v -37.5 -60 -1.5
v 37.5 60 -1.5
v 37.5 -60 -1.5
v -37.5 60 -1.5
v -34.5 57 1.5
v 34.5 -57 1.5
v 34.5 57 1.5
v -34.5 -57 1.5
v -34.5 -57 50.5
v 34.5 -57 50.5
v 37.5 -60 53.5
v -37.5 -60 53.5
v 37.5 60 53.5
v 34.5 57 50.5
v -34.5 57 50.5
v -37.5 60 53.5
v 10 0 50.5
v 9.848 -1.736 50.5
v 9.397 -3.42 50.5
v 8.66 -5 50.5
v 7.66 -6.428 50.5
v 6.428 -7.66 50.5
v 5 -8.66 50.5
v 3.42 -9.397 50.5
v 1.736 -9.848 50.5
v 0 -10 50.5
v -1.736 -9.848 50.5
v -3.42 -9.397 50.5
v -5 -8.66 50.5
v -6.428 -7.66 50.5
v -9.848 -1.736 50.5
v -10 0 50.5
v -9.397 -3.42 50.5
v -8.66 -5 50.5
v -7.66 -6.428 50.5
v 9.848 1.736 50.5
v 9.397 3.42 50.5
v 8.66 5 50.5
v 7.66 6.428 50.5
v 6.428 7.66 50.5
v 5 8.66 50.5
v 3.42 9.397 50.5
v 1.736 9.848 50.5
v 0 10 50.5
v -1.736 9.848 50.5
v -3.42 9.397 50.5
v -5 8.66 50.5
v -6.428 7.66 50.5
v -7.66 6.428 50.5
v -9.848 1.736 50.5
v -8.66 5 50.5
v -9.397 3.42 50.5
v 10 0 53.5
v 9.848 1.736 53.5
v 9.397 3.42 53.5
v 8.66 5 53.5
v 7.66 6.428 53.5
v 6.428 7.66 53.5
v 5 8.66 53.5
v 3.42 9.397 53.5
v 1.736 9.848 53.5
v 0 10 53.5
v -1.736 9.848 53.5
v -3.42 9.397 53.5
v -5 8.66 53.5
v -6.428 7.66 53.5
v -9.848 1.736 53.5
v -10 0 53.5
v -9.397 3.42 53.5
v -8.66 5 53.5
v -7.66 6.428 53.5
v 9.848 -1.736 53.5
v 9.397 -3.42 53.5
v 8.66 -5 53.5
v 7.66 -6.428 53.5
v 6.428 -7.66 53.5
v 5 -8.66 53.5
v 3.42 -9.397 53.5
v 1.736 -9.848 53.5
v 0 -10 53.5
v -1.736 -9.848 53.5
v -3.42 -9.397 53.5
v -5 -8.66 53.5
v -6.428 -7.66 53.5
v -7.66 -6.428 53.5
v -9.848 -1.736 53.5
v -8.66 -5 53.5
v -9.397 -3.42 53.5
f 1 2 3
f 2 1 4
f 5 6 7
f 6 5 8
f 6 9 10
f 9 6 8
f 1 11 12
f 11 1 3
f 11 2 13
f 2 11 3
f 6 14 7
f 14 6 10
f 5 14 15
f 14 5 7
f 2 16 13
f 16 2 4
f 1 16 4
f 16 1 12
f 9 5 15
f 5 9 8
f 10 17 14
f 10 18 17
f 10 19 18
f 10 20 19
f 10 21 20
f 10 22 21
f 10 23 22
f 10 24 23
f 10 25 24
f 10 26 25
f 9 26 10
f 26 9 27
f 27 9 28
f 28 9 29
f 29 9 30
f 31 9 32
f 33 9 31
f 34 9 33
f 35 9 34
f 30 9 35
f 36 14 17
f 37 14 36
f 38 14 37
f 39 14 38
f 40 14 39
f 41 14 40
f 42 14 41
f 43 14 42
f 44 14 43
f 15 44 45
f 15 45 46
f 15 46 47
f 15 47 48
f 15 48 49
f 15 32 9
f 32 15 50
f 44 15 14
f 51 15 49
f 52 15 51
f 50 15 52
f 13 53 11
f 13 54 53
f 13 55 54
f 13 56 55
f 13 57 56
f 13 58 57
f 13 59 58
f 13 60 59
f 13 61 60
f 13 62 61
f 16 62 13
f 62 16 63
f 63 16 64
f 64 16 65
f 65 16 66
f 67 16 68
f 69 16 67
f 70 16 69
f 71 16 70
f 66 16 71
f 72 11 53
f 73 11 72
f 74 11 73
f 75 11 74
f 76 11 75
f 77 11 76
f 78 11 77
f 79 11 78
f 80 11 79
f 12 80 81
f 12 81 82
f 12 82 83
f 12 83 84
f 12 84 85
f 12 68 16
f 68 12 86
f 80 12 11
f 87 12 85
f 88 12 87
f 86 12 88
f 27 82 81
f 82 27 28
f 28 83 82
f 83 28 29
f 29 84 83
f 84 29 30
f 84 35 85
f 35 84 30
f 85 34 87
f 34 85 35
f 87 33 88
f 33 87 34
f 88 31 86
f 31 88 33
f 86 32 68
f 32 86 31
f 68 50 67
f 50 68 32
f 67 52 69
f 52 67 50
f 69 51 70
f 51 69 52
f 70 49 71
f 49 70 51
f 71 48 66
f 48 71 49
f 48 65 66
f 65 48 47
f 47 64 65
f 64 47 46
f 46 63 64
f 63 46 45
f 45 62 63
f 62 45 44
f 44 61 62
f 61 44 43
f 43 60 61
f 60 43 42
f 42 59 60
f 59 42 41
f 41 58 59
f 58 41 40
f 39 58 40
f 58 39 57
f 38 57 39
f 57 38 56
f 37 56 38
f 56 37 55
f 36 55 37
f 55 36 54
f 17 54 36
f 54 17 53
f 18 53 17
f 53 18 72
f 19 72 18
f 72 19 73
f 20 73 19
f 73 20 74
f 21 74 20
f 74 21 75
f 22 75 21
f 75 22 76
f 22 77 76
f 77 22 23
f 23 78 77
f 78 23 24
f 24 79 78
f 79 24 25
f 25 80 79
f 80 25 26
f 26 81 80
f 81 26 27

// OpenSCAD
/*
Create an outline for a laser cut box with finger joints
Released under the Creative Commons Attribution License
Some Rights Reserved: aaron . ciuffo 2 gmail.com

Version 3.0 12 November 2014
  * rewrite from scratch
  * removed kerf all together

Version 3.1 13 November 2014
  * reworked layout2D to handled a greater variety of part sizes

Version 3.2 13 November 2014
  * verified that removing kerf handling was a good idea
  * fixed small issue with layout2D
  * cookies?

Version 3.3 15 November 2014
  * fixed a few typos - Thanks Mixomycetes for pointing those out

*/

/*[Box Outside Dimensions]*/
//Box Width - X
bX=75;
//Box Depth - Y
bY=120;
//Box Height - Z
bZ=55;
//Material Thickness
thick=3;

/*[Box Features]*/
//Include a lid?
addLid=1; //[1:Lid, 0:No Lid]
//Finger Hole Diameter - 0==no hole
holeDia=20; //[0:50]
holeFacets=36;//[3:36]

/*[Finger Width]*/
//Finger width (NB! width must be < 1/3 shortest side)
fingerW=5;//[3:20]
//Lid finger width 
fingerLidW=15;//[3:20]
//Laser kerf
kerf=0.1;

/*[Layout]*/
//separation of finished pieces
separation=1;
//transparency of 3D model
alpha=50; //[1:100]
2D=0; //[1:2D for DXF, 0:3D for STL]

/*[Hidden]*/
//transparency alpha
alp=1-alpha/100;






//cuts that fall complete inside the edge
module insideCuts(length, fWidth, cutD, uDiv) {
  //Calculate the number of fingers and cuts
  numFinger=floor(uDiv/2);
  numCuts=ceil(uDiv/2);

  //draw out rectangles for slots
  for (i=[0:numCuts-1]) {
    translate([i*(fWidth*2), 0, 0])
      square([fWidth, cutD]);
  }
}

//cuts that fall at the end of an edge requirng an extra long cut
module outsideCuts(length, fWidth, cutD, uDiv) {
  numFinger=ceil(uDiv/2);
  numCuts=floor(uDiv/2);
  //calculate the length of the extra long cut
  endCut=(length-uDiv*fWidth)/2;
  //amount of padding to add to the itterative placement of cuts 
  // this is the extra long cut at the beginning and end of the edge
  padding=endCut+fWidth;
  
  square([endCut, cutD]);

  for (i=[0:numCuts]) {
    if (i < numCuts) {
      translate([i*(fWidth*2)+padding, 0, 0])
        square([fWidth, cutD]);
    } else {
      translate([i*(fWidth*2)+padding, 0, 0])
        square([endCut, cutD]);
    }
  }


  
}



//Face A (X and Z dimensions)
//Front and back face
module faceA(uDivX, uDivY, uDivZ, uDivLX, uDivLY) {
  difference() {
    square([bX, bZ], center=true);

    //X+/- edge (X axis in OpenSCAD)
    //if true, make cuts for the lid, otherwise leave a blank edge
    if (addLid) {
      translate([-uDivLX*fingerLidW/2, bZ/2-thick, 0])
        insideCuts(len=bX, fWidth=fingerLidW, cutD=thick, uDiv=uDivLX);
    }
    translate([-uDivX*fingerW/2, -bZ/2, 0]) 
      insideCuts(length=bX, fWidth=fingerW, cutD=thick, uDiv=uDivX);

    //Z+/- edge (Y axis in OpenSCAD)
    translate([bX/2-thick, uDivZ*fingerW/2, 0]) rotate([0, 0, -90])
      insideCuts(length=bZ, fWidth=fingerW, cutD=thick, uDiv=uDivZ);
    translate([-bX/2, uDivZ*fingerW/2, 0]) rotate([0, 0, -90])
      insideCuts(length=bZ, fWidth=fingerW, cutD=thick, uDiv=uDivZ);

  }
}

//Face B (X and Y dimensions)
//Lid and base
module faceB(uDivX, uDivY, uDivZ, uDivLX, uDivLY, makeLid=0) {

  //if this is the "lid" use fingerLidW dimensions instead of fingerW
  //create the local version of these variables

  uDivXloc= makeLid==1 ? uDivLX : uDivX;
  uDivYloc= makeLid==1 ? uDivLY : uDivY;
  fingerWloc= makeLid==1 ? fingerLidW : fingerW;
  lidHoleLoc= makeLid==1 ? holeDia/2 : 0;

  difference() {
    square([bX, bY], center=true);

    //X+/- edge
    translate([-bX/2, bY/2-thick, 0])
      outsideCuts(length=bX, fWidth=fingerWloc, cutD=thick, uDiv=uDivXloc);
    translate([-bX/2, -bY/2, 0])
      outsideCuts(length=bX, fWidth=fingerWloc, cutD=thick, uDiv=uDivXloc);

    //Y+/- edge
    translate([bX/2-thick, uDivYloc*fingerWloc/2, 0]) rotate([0, 0, -90])
      insideCuts(length=bY, fWidth=fingerWloc, cutD=thick, uDiv=uDivYloc);
    translate([-bX/2, uDivYloc*fingerWloc/2, 0]) rotate([0, 0, -90])
      insideCuts(length=bY, fWidth=fingerWloc, cutD=thick, uDiv=uDivYloc);
  
    //lid hole with holeFacets sides
    circle(r=lidHoleLoc, $fn=holeFacets);
  }
  
}

//Face C (Z and Y dimensions)
//left and right sides
module faceC(uDivX, uDivY, uDivZ, uDivLX, uDivLY) {

  difference() {
    square([bY, bZ], center=true);
    
    //Y+/- edge (X axis in OpenSCAD)
    //make cuts for the lid or leave a straight edge
    if(addLid) {
      translate([-bY/2, bZ/2-thick, 0])
        outsideCuts(length=bY, fWidth=fingerLidW, cutD=thick, uDiv=uDivLY);  
    }
    translate([-bY/2, -bZ/2, 0])
      outsideCuts(length=bY, fWidth=fingerW, cutD=thick, uDiv=uDivY);

    //Z+/- edge (Y axis in OpenSCAD)
    translate([bY/2-thick, bZ/2, 0]) rotate([0, 0, -90])
      outsideCuts(length=bZ, fWidth=fingerW, cutD=thick, uDiv=uDivZ);
    translate([-bY/2, bZ/2, 0]) rotate([0, 0, -90])
      outsideCuts(length=bZ, fWidth=fingerW, cutD=thick, uDiv=uDivZ);
      

  }
}

module layout2D(uDivX, uDivY, uDivZ, uDivLX, uDivLY) {
  yDisplace= bY>bZ ? bY : bZ+separation;

  translate([])
    color("red") faceA(uDivX, uDivY, uDivZ, uDivLX, uDivLY);
  translate([bX+separation+bY+separation, 0, 0])
    color("darkred") faceA(uDivX, uDivY, uDivZ, uDivLX, uDivLY);



  translate([bX/2+bY/2+separation, 0, 0])
    color("blue") faceC(uDivX, uDivY, uDivZ, uDivLX, uDivLY);
  //bottom row
  translate([bX/2+bY/2+separation, -yDisplace, 0])
    color("darkblue") faceC(uDivX, uDivY, uDivZ, uDivLX, uDivLY);



  if (addLid) {
    //bottomo row
    translate([0, -bZ/2-yDisplace/2-separation, 0])
      color("lime") faceB(uDivX, uDivY, uDivZ, uDivLX, uDivLY, makeLid=1);
  }
  translate([bX+separation+bY+separation, -bZ/2-yDisplace/2-separation, 0])
    color("green") faceB(uDivX, uDivY, uDivZ, uDivLX, uDivLY, makeLid=0);
}

module layout3D(uDivX, uDivY, uDivZ, uDivLX, uDivLY, alp=0.5) {
  //amount to shift for cut depth 
  D=thick/2;


  //bottom of box (B-)
  color("green", alpha=alp)
    translate([0, 0, 0])
    linear_extrude(height=thick, center=true) faceB(uDivX, uDivY, uDivZ, uDivLX, 
      uDivLY, makeLid=0);

  if (addLid) {
    color("lime", alpha=alp)
      translate([0, 0, bZ-thick])
      linear_extrude(height=thick, center=true) faceB(uDivX, uDivY, uDivZ, uDivLX, 
        uDivLY, makeLid=1);
  }

  color("red", alpha=alp)
    translate([0, bY/2-D, bZ/2-D]) rotate([90, 0, 0])
    linear_extrude(height=thick, center=true) faceA(uDivX, uDivY, uDivZ, uDivLX, 
      uDivLY);

  color("darkred", alpha=alp)
    translate([0, -bY/2+D, bZ/2-D]) rotate([90, 0, 0])
    linear_extrude(height=thick, center=true) faceA(uDivX, uDivY, uDivZ, uDivLX, 
      uDivLY);
   
  color("blue", alpha=alp)
    translate([bX/2-D, 0, bZ/2-D]) rotate([90, 0, 90])
    linear_extrude(height=thick, center=true) faceC(uDivX, uDivY, uDivZ, uDivLX, 
      uDivLY);
  color("darkblue", alpha=alp)
    translate([-bX/2+D, 0, bZ/2-D]) rotate([90, 0, 90])
    linear_extrude(height=thick, center=true) faceC(uDivX, uDivY, uDivZ, uDivLX, 
      uDivLY);
  

}


module main() {
  //Calculate the maximum number of fingers and cuts possible
  maxDivX=floor(bX/fingerW);
  maxDivY=floor(bY/fingerW);
  maxDivZ=floor(bZ/fingerW);

  //Calculate the max number of fingers and cuts for the lid
  maxDivLX=floor(bX/fingerLidW);
  maxDivLY=floor(bY/fingerLidW);

  //the usable divisions value must be odd for this layout
  uDivX= (maxDivX%2)==0 ? maxDivX-3 : maxDivX-2;
  uDivY= (maxDivY%2)==0 ? maxDivY-3 : maxDivY-2;
  uDivZ= (maxDivZ%2)==0 ? maxDivZ-3 : maxDivZ-2;
  uDivLX= (maxDivLX%2)==0 ? maxDivLX-3 : maxDivLX-2;
  uDivLY= (maxDivLY%2)==0 ? maxDivLY-3 : maxDivLY-2;

  if(2D) {
    layout2D(uDivX, uDivY, uDivZ, uDivLX, uDivLY);
  } else {
    layout3D(uDivX, uDivY, uDivZ, uDivLX, uDivLY);
  }
}

main();
